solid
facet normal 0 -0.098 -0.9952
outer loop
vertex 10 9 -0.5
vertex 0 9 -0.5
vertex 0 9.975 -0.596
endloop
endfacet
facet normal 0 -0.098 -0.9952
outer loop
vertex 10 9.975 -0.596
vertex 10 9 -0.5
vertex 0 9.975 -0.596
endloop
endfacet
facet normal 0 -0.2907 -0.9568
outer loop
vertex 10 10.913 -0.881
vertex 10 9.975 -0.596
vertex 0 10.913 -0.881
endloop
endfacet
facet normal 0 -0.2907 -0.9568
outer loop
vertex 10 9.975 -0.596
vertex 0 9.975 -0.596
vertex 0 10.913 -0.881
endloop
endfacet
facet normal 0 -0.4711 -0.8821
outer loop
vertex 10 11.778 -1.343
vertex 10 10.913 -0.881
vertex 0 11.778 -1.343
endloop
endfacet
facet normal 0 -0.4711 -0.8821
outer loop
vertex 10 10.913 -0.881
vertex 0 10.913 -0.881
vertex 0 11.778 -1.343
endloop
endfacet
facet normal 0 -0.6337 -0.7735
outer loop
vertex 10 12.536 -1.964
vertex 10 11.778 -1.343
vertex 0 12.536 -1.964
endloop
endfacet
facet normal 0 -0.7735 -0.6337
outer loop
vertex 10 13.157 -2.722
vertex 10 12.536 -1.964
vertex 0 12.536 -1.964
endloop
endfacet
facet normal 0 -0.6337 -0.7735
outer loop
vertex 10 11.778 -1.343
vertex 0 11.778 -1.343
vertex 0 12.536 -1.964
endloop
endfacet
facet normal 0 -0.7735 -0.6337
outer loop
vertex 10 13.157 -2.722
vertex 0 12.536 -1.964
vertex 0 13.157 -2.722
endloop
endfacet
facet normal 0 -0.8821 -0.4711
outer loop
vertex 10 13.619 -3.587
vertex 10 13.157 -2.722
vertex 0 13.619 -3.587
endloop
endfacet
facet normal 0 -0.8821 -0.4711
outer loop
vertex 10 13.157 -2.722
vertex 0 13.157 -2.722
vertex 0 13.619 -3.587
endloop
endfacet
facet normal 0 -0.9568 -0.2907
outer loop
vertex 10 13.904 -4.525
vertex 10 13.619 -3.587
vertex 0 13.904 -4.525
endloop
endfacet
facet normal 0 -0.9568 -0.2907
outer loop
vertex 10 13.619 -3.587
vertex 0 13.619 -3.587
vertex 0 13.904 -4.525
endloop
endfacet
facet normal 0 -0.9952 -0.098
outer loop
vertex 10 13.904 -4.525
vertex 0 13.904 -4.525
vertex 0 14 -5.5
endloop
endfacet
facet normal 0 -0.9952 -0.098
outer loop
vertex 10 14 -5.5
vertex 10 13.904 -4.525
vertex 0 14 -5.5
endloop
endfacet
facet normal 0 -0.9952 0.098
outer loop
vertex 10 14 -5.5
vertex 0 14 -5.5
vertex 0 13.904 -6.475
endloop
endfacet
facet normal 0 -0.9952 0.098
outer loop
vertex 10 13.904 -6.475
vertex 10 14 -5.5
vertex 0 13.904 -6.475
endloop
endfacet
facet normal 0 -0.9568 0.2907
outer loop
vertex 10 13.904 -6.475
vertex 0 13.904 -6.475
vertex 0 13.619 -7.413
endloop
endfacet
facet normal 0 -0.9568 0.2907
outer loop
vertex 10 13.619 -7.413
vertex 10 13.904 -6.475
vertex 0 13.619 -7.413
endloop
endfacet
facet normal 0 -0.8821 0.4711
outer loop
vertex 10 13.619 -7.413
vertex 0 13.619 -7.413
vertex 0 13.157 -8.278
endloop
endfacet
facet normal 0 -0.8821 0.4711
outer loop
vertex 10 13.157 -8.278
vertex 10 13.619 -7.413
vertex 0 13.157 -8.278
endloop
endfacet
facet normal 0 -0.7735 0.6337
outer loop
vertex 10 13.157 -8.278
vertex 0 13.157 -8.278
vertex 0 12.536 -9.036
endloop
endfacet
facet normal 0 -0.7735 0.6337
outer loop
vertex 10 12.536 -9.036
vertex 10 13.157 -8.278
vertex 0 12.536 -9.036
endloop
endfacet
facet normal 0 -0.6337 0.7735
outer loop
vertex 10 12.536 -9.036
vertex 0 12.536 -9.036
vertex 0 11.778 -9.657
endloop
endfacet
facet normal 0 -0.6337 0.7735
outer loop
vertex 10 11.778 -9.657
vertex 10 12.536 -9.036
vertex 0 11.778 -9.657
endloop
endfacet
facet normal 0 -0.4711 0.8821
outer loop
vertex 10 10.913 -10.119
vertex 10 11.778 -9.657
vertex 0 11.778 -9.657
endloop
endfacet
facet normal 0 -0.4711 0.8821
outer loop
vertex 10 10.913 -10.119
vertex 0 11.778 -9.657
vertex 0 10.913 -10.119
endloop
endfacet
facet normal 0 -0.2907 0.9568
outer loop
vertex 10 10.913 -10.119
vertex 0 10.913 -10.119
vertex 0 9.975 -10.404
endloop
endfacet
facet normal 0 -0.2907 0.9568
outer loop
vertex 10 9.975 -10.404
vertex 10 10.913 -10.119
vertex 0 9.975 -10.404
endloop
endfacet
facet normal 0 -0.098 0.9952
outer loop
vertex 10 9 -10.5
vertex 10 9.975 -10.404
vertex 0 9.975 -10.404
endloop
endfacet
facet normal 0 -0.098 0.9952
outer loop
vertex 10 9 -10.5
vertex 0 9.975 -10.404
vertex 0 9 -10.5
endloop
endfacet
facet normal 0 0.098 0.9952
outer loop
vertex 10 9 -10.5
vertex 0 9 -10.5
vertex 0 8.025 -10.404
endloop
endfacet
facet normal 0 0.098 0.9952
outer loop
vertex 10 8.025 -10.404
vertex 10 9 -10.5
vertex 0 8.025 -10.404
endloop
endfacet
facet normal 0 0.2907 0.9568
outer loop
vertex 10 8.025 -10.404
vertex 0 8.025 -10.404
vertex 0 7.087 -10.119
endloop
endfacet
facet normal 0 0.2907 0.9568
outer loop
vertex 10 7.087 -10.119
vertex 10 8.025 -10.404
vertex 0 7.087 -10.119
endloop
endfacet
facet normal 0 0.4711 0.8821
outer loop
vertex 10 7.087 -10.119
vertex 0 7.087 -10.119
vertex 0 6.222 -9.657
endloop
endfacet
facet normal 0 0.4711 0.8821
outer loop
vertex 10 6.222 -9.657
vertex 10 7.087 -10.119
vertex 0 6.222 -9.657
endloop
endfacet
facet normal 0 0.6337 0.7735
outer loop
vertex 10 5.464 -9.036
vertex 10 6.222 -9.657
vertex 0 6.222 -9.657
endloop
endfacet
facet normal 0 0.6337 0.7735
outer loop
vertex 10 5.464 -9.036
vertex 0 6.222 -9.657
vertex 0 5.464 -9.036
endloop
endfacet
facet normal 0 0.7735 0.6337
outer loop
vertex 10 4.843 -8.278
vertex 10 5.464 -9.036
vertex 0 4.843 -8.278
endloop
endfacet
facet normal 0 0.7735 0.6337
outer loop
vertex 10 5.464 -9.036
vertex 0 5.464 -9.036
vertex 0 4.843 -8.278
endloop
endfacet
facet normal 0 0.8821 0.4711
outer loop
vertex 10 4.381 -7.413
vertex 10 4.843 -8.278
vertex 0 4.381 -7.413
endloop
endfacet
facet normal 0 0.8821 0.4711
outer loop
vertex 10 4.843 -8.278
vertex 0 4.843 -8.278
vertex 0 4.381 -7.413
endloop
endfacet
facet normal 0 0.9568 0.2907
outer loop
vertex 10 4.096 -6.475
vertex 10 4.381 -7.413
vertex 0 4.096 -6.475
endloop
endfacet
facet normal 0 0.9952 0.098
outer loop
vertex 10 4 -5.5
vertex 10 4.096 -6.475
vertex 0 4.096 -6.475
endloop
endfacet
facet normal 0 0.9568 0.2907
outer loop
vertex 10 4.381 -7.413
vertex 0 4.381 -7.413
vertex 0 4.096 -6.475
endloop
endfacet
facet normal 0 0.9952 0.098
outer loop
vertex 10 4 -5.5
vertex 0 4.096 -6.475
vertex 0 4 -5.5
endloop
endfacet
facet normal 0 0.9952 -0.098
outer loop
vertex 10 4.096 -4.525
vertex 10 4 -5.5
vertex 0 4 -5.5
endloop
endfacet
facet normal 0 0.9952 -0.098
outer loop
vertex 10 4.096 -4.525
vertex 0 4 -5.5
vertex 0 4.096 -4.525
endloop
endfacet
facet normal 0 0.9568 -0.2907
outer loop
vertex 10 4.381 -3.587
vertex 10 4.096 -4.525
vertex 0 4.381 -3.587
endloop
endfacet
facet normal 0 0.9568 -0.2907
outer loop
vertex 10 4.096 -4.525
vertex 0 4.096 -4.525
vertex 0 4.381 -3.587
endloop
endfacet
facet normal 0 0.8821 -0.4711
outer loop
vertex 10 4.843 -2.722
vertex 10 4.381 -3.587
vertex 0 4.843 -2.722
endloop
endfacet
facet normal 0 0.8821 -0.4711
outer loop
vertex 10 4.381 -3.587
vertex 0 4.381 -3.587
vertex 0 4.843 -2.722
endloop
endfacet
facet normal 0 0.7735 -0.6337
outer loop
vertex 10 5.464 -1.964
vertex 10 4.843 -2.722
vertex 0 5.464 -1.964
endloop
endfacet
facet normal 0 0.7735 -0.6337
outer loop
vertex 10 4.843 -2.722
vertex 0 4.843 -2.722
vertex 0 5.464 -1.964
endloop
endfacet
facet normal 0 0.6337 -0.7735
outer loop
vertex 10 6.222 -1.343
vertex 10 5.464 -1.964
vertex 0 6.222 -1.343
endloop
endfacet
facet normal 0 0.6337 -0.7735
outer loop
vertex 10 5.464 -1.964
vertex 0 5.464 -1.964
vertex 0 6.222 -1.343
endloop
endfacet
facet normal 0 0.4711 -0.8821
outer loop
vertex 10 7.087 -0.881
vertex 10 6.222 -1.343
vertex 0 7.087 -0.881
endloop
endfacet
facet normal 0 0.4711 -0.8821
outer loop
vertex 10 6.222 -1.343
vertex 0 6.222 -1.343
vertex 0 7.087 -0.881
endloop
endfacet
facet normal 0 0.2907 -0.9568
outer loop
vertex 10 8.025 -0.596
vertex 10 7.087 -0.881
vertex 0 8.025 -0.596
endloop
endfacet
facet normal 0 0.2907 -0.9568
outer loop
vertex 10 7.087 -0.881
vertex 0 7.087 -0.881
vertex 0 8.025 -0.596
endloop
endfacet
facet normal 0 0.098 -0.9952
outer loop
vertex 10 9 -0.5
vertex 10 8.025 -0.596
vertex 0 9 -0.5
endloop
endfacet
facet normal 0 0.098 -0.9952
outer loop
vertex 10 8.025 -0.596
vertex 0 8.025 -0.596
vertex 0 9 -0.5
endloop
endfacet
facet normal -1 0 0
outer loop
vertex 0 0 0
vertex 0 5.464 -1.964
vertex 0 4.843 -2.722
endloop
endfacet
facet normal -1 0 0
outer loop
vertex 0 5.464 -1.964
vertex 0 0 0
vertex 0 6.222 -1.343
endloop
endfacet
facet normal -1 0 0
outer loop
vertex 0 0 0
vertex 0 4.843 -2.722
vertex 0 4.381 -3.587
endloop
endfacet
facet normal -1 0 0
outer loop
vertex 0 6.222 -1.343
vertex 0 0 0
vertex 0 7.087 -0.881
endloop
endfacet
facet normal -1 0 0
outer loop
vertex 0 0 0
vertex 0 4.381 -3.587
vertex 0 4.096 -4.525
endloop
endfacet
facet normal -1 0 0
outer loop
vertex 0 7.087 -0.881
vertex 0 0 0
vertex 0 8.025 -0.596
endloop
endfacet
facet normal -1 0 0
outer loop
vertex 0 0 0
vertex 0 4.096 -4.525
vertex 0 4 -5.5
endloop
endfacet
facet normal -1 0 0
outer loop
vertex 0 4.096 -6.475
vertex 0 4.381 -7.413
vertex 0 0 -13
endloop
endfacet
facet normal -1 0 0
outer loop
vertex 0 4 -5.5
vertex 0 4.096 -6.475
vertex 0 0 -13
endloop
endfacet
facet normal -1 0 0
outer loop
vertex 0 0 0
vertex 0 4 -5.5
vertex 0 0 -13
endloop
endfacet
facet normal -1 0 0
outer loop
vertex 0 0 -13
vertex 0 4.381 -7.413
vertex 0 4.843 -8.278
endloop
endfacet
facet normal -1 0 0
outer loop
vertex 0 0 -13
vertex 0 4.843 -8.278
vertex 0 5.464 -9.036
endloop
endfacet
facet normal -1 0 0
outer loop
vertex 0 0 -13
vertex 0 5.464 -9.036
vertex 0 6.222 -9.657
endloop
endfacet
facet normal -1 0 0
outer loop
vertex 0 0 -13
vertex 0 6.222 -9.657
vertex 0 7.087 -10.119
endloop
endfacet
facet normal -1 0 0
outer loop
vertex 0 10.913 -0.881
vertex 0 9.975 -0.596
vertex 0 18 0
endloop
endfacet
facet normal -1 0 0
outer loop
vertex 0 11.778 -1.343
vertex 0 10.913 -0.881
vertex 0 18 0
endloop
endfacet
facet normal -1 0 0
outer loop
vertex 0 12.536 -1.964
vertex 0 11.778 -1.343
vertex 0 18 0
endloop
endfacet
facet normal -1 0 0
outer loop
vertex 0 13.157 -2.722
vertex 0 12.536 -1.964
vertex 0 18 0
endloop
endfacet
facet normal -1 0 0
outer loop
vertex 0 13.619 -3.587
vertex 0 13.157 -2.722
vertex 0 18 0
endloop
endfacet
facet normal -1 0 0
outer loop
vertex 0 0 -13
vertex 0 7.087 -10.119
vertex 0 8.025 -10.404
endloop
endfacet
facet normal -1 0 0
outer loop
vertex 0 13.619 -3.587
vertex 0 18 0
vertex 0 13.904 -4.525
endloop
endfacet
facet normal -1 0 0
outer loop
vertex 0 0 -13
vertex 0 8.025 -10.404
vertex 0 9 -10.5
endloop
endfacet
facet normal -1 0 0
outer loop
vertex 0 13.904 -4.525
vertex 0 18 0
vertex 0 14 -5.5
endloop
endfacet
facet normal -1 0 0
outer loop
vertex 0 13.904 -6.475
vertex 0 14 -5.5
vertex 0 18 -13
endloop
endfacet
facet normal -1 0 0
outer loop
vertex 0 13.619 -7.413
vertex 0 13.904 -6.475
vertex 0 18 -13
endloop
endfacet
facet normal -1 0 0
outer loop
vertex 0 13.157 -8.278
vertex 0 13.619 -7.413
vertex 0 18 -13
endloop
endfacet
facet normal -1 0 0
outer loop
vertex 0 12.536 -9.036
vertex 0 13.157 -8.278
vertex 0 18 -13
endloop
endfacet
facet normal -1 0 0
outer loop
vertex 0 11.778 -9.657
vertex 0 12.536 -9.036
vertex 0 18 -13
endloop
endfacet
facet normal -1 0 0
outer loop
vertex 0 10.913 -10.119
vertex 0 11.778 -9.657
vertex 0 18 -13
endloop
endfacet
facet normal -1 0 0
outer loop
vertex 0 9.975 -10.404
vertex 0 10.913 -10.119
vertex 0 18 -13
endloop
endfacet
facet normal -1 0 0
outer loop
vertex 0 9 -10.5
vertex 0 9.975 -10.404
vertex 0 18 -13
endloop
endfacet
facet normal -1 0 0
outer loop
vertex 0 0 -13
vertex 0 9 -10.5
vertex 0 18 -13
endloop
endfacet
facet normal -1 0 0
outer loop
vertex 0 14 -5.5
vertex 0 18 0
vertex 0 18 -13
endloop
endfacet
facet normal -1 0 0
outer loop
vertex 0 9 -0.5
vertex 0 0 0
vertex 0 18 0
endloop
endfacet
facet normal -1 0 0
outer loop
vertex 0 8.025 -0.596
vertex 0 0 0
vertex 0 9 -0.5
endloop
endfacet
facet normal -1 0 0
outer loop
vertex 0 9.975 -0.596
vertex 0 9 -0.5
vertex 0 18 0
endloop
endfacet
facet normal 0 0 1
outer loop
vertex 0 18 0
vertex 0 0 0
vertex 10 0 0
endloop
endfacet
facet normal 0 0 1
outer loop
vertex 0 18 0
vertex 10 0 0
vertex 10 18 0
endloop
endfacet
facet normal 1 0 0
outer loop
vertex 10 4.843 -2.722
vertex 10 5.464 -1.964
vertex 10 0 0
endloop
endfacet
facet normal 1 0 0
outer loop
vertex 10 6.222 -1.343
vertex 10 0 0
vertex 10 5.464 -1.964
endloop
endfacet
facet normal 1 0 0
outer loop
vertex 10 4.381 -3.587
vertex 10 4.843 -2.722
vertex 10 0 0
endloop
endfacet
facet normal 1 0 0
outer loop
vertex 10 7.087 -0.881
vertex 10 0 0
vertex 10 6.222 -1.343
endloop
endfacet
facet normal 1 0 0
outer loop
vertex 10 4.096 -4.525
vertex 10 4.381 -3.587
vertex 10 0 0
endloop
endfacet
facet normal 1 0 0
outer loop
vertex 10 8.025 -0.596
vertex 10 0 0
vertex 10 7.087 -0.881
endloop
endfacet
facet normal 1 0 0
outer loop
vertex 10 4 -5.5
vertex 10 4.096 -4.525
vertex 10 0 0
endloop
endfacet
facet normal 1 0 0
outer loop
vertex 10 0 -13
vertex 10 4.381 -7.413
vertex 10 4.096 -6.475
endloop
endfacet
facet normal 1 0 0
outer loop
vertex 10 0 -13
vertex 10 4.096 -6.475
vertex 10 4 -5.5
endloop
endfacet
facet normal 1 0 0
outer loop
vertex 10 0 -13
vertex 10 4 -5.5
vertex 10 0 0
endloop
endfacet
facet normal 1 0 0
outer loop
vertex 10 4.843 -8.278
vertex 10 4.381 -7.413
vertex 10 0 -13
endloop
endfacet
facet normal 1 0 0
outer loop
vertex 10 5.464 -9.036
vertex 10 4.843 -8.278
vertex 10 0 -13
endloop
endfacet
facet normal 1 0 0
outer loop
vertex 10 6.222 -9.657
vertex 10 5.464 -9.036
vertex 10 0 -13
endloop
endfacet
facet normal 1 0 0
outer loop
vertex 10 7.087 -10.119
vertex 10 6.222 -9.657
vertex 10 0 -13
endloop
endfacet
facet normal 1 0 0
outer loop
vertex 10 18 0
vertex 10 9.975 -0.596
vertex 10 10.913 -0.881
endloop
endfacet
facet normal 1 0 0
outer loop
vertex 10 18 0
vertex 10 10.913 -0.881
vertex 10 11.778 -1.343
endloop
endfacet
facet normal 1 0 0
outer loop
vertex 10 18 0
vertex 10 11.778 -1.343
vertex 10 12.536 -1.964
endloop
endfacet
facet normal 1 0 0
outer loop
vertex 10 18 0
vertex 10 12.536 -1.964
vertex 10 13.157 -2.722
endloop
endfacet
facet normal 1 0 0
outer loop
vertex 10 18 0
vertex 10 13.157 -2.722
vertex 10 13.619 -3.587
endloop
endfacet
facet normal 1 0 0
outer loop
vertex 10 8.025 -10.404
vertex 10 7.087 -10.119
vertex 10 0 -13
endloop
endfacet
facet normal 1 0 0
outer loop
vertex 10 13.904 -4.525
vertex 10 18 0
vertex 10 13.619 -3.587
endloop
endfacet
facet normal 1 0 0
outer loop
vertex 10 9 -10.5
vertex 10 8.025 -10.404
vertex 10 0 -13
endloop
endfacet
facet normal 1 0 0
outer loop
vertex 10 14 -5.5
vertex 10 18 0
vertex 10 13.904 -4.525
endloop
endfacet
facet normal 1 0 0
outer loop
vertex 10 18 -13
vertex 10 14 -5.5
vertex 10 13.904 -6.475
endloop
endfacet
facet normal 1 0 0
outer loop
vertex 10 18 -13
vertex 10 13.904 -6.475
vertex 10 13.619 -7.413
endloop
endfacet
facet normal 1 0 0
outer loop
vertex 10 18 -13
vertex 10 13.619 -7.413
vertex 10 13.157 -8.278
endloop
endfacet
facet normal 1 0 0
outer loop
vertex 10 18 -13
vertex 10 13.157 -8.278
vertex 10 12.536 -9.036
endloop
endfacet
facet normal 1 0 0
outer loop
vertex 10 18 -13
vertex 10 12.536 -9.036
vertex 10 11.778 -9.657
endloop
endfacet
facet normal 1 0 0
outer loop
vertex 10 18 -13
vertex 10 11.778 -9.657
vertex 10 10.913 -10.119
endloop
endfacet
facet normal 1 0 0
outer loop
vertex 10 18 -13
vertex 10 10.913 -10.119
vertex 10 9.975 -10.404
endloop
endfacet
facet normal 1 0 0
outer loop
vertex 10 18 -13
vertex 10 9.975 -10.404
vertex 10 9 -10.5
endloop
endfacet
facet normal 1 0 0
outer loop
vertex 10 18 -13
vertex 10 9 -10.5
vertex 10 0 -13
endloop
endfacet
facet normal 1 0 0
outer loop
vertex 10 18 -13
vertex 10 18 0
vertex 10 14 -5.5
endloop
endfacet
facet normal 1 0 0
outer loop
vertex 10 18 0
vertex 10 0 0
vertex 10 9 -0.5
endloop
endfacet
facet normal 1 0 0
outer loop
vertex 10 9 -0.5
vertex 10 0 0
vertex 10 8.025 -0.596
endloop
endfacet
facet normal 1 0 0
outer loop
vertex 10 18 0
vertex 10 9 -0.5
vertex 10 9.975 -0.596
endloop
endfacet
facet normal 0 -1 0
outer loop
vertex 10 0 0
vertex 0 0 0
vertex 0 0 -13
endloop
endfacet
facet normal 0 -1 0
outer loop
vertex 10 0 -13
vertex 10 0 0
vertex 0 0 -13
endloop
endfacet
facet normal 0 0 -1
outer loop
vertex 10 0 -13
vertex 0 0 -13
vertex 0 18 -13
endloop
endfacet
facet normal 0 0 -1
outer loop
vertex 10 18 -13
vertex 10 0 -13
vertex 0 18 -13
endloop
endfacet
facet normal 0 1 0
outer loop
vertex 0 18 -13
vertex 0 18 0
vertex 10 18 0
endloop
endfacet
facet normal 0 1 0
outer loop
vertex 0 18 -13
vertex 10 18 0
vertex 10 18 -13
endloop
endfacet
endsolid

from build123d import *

# Parameters (mm, degrees)
ESQUISSE1_W             = 13
ESQUISSE1_H             = 18
EXTRUSION1_DEPTH        = 10
ESQUISSE2_R             = 5
ENL_V_MAT_EXTRU_1_DEPTH = 11


with BuildPart() as part:
    # Esquisse1 → Extrusion1 (new body)
    with BuildSketch(Plane(origin=(0, 0, 0), x_dir=(0, 0, -1), z_dir=(1, 0, 0))):
        with Locations((6.5, 9)):
            Rectangle(ESQUISSE1_W, ESQUISSE1_H)
    extrude(amount=EXTRUSION1_DEPTH)

    # Esquisse2 → Enlèv. mat.-Extru.1 (cut, through all)
    with BuildSketch(Plane.ZY):
        with Locations((-5.5, 9)):
            Circle(ESQUISSE2_R)
    extrude(amount=-ENL_V_MAT_EXTRU_1_DEPTH, mode=Mode.SUBTRACT)


solid = part.part
